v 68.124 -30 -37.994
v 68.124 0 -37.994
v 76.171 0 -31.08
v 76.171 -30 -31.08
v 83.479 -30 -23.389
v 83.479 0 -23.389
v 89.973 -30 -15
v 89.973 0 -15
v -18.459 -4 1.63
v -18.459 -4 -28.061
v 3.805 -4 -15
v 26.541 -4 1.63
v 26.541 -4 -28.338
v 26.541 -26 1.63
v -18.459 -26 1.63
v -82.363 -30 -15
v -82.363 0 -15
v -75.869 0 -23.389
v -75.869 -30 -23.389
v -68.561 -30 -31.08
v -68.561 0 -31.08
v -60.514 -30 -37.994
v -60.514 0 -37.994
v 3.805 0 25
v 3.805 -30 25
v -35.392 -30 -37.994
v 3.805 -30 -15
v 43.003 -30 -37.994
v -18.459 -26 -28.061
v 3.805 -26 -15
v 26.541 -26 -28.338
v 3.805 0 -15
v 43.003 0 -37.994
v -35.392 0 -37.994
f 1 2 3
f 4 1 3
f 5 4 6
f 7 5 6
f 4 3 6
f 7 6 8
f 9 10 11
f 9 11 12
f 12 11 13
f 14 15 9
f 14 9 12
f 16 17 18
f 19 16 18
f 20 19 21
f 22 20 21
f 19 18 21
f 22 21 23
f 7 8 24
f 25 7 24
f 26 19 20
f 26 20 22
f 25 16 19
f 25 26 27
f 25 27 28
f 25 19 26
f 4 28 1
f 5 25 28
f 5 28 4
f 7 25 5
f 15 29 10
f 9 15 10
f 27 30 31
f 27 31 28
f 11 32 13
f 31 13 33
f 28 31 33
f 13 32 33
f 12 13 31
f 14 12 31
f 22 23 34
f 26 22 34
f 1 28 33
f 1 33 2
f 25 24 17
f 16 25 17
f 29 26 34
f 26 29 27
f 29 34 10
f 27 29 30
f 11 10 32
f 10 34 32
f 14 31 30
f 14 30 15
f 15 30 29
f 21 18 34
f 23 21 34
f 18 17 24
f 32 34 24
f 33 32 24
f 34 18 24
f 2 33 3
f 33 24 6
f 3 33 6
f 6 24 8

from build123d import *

# Parameters (mm, degrees)
F1_DEPTH = 30
F3_DEPTH = 39.624


with BuildPart() as f1:
    # F0 (on Front) → F1 (new body)
    with BuildSketch(Plane.XZ):
        with BuildLine():
            ThreePointArc((68.123961, -37.994432), (79.922035, -27.327051), (89.973475, -15))
            Line((89.973475, -15), (3.805035, 25))
            Line((3.805035, 25), (-82.363405, -15))
            ThreePointArc((-82.363405, -15), (-72.311965, -27.327051), (-60.513891, -37.994432))
            Line((-60.513891, -37.994432), (-35.392356, -37.994432))
            Line((-35.392356, -37.994432), (3.805035, -15))
            Line((3.805035, -15), (43.002567, -37.994432))
            Line((43.002567, -37.994432), (68.123961, -37.994432))
        make_face()
    extrude(amount=F1_DEPTH)

    # F2 (on face) → F3 (cut)
    with BuildSketch(Plane(origin=(0, 0, -37.994432), x_dir=(1, 0, 0), z_dir=(0, 0, -1))):
        Polygon((0, 4), (26.541401, 4), (26.541401, 26), (-18.458599, 26), (-18.458599, 4), align=None)
    extrude(amount=-F3_DEPTH, mode=Mode.SUBTRACT)


solid = f1.part
